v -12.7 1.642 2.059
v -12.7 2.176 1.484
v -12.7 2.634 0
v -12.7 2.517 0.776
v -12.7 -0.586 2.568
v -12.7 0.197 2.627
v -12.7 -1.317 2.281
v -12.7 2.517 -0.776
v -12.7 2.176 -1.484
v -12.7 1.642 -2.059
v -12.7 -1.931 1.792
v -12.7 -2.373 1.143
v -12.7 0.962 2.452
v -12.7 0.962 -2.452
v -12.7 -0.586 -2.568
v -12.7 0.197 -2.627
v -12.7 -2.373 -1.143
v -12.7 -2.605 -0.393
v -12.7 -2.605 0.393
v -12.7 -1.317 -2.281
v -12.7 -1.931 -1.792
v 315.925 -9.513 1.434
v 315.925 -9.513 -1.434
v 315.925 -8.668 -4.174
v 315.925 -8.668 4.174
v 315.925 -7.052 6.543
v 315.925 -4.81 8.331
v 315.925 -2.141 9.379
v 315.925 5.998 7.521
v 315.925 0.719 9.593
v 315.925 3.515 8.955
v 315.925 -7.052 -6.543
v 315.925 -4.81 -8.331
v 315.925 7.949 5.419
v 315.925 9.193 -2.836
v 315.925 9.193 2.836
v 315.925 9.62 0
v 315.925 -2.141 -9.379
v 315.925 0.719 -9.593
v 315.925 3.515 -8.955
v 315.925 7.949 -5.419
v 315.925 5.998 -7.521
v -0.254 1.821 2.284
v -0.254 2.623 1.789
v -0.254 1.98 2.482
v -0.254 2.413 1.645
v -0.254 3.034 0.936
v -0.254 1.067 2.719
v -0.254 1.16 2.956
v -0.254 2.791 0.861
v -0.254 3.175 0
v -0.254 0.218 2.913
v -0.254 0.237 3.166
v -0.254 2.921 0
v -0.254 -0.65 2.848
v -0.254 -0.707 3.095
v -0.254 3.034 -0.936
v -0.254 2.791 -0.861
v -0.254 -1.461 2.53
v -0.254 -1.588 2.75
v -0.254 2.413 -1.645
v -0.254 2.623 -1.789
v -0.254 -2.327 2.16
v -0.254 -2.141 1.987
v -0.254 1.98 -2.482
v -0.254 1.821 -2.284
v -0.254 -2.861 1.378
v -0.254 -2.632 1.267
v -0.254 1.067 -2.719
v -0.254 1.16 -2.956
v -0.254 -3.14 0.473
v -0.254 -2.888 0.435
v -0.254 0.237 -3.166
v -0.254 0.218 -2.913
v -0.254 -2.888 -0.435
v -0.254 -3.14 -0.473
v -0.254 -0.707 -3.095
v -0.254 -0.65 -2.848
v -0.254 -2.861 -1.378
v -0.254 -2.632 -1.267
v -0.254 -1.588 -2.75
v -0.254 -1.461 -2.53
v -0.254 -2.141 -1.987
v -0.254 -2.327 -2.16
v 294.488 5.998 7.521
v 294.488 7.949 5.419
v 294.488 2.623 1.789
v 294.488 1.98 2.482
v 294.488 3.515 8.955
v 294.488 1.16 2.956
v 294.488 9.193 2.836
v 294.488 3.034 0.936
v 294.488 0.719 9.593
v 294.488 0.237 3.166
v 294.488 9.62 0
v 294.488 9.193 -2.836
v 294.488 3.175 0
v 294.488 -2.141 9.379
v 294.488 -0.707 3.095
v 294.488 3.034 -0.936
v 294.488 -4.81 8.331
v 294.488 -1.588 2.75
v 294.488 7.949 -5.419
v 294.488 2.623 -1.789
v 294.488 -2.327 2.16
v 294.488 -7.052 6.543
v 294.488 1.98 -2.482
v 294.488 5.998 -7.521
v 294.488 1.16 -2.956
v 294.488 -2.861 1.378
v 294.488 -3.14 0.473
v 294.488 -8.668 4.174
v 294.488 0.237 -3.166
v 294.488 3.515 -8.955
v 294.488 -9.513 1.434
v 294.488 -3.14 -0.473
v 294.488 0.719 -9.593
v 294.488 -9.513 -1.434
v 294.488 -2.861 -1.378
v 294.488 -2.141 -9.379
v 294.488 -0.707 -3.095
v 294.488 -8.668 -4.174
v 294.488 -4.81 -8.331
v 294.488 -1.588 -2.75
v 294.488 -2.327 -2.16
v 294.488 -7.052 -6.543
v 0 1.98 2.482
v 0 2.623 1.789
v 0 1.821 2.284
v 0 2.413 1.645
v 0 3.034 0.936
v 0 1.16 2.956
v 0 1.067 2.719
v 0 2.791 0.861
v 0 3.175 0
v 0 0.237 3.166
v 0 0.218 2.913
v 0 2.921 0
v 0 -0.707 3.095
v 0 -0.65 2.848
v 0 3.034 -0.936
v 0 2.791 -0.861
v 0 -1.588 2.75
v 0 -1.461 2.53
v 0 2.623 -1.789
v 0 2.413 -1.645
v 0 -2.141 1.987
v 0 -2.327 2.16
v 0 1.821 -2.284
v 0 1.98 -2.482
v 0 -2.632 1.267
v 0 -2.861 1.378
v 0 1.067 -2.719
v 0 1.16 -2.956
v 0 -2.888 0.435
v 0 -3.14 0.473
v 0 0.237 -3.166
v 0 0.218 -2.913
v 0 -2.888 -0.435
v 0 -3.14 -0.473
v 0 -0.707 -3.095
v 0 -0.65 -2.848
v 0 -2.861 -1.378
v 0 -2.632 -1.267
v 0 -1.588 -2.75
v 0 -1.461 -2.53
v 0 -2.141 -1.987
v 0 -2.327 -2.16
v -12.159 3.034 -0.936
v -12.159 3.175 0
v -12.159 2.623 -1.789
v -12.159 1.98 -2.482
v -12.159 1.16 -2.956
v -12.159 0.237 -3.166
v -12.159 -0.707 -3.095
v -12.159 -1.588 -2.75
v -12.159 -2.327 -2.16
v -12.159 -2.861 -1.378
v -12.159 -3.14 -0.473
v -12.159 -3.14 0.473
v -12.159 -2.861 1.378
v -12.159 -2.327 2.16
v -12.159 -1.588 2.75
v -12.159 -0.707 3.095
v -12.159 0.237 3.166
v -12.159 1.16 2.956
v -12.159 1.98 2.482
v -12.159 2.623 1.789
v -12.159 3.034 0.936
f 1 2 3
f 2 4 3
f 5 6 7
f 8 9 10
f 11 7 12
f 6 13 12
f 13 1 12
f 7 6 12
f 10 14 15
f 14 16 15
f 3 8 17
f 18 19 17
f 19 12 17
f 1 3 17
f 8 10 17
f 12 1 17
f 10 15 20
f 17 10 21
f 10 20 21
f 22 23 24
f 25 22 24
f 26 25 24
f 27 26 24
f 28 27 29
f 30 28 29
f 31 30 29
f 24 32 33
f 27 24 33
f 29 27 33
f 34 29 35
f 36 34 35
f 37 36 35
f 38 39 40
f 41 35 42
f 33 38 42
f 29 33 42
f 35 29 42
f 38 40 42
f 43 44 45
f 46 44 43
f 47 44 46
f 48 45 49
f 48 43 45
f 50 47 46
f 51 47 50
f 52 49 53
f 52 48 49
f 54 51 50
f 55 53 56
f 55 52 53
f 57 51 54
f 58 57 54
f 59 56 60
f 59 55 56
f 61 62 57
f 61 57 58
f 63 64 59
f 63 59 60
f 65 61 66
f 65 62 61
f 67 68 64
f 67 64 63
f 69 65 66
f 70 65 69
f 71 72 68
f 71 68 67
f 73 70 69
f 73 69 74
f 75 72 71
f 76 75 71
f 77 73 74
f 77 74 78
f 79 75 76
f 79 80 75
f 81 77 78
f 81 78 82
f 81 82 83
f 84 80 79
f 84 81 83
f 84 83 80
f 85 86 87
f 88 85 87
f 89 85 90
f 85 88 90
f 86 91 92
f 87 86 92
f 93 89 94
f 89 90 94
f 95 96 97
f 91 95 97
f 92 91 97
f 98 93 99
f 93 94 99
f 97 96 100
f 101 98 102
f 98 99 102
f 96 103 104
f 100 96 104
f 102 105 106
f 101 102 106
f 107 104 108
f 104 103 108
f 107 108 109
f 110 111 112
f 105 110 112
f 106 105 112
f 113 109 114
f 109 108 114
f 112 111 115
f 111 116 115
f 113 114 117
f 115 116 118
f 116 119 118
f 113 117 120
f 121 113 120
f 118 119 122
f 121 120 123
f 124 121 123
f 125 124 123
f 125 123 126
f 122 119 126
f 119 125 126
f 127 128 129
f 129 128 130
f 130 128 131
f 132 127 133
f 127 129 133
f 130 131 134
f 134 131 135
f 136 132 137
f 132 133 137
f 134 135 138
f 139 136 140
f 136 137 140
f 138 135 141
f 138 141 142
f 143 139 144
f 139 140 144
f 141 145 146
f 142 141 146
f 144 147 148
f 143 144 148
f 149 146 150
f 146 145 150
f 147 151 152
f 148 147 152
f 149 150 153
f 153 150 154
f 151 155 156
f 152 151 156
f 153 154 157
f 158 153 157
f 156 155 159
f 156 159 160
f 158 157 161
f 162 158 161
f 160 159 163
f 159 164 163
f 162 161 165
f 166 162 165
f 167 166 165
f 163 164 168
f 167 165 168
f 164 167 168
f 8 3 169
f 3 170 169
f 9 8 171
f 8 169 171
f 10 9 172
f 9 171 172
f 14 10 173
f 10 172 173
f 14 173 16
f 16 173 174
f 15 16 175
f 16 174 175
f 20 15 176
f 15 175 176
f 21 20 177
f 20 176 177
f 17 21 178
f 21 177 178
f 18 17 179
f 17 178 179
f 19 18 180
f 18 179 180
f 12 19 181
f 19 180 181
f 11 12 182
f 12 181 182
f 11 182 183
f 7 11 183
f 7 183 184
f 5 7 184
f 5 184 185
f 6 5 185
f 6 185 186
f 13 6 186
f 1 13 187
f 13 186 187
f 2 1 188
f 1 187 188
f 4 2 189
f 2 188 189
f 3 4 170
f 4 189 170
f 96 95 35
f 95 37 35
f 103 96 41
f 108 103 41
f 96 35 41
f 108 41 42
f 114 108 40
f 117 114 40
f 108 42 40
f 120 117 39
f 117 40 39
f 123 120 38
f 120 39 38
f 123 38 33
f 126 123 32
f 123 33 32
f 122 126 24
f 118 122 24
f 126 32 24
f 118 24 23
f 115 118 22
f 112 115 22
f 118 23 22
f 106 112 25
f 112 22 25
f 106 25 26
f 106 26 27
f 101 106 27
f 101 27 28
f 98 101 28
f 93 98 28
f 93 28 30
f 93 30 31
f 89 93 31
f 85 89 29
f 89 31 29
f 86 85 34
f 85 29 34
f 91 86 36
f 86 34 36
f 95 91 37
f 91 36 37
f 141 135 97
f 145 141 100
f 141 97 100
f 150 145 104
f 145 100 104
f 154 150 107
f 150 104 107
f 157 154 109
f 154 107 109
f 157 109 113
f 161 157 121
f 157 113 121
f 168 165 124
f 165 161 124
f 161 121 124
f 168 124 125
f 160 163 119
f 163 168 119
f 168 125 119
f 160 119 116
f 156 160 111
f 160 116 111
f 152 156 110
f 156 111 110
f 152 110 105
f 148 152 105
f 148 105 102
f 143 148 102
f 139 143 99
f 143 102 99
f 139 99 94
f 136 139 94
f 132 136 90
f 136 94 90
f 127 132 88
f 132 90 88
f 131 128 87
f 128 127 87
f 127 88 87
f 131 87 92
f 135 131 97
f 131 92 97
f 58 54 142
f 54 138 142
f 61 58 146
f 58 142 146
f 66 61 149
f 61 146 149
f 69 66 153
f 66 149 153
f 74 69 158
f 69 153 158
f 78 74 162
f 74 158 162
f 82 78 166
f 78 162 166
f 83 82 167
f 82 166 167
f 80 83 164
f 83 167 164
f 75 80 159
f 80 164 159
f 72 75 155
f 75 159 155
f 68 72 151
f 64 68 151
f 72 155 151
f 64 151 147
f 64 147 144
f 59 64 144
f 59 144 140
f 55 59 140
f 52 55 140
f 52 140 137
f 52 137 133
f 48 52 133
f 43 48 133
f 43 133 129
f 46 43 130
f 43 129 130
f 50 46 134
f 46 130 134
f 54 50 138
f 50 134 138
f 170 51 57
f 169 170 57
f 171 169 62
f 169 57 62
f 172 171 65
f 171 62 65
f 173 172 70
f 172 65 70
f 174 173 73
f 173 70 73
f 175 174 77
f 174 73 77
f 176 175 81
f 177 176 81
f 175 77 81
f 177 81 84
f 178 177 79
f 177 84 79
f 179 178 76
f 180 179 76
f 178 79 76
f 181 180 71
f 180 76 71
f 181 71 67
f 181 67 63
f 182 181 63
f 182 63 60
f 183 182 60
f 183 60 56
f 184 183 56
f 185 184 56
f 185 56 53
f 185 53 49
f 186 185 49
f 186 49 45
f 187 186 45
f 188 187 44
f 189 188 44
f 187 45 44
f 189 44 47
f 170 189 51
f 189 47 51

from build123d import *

# Parameters (mm, degrees)
SKETCH3_W = 0.254
SKETCH3_H = 0.508


with BuildPart() as part:
    # Sketch1 → Revolve1 (revolve)
    with BuildSketch(Plane.XY):
        Polygon((0, 0), (0, 3.175), (294.4876, 3.175), (294.4876, 9.62025), (315.9252, 9.62025), (315.9252, 0), align=None)
    revolve(axis=Axis((315.9252, 0, 0), (-1, 0, 0)))

    # Sketch2 → Revolve2 (revolve)
    with BuildSketch(Plane.XY):
        Polygon((-12.7, 0), (-12.7, 2.63398), (-12.15898, 3.175), (0, 3.175), (0, 0), align=None)
    revolve(axis=Axis((0, 0, 0), (-1, 0, 0)))

    # Sketch3 → Cut-Revolve1 (revolve, cut)
    with BuildSketch(Plane.XY):
        with Locations((-0.127, 3.175)):
            Rectangle(SKETCH3_W, SKETCH3_H)
    revolve(axis=Axis((0, 0, 0), (-1, 0, 0)), mode=Mode.SUBTRACT)


solid = part.part
